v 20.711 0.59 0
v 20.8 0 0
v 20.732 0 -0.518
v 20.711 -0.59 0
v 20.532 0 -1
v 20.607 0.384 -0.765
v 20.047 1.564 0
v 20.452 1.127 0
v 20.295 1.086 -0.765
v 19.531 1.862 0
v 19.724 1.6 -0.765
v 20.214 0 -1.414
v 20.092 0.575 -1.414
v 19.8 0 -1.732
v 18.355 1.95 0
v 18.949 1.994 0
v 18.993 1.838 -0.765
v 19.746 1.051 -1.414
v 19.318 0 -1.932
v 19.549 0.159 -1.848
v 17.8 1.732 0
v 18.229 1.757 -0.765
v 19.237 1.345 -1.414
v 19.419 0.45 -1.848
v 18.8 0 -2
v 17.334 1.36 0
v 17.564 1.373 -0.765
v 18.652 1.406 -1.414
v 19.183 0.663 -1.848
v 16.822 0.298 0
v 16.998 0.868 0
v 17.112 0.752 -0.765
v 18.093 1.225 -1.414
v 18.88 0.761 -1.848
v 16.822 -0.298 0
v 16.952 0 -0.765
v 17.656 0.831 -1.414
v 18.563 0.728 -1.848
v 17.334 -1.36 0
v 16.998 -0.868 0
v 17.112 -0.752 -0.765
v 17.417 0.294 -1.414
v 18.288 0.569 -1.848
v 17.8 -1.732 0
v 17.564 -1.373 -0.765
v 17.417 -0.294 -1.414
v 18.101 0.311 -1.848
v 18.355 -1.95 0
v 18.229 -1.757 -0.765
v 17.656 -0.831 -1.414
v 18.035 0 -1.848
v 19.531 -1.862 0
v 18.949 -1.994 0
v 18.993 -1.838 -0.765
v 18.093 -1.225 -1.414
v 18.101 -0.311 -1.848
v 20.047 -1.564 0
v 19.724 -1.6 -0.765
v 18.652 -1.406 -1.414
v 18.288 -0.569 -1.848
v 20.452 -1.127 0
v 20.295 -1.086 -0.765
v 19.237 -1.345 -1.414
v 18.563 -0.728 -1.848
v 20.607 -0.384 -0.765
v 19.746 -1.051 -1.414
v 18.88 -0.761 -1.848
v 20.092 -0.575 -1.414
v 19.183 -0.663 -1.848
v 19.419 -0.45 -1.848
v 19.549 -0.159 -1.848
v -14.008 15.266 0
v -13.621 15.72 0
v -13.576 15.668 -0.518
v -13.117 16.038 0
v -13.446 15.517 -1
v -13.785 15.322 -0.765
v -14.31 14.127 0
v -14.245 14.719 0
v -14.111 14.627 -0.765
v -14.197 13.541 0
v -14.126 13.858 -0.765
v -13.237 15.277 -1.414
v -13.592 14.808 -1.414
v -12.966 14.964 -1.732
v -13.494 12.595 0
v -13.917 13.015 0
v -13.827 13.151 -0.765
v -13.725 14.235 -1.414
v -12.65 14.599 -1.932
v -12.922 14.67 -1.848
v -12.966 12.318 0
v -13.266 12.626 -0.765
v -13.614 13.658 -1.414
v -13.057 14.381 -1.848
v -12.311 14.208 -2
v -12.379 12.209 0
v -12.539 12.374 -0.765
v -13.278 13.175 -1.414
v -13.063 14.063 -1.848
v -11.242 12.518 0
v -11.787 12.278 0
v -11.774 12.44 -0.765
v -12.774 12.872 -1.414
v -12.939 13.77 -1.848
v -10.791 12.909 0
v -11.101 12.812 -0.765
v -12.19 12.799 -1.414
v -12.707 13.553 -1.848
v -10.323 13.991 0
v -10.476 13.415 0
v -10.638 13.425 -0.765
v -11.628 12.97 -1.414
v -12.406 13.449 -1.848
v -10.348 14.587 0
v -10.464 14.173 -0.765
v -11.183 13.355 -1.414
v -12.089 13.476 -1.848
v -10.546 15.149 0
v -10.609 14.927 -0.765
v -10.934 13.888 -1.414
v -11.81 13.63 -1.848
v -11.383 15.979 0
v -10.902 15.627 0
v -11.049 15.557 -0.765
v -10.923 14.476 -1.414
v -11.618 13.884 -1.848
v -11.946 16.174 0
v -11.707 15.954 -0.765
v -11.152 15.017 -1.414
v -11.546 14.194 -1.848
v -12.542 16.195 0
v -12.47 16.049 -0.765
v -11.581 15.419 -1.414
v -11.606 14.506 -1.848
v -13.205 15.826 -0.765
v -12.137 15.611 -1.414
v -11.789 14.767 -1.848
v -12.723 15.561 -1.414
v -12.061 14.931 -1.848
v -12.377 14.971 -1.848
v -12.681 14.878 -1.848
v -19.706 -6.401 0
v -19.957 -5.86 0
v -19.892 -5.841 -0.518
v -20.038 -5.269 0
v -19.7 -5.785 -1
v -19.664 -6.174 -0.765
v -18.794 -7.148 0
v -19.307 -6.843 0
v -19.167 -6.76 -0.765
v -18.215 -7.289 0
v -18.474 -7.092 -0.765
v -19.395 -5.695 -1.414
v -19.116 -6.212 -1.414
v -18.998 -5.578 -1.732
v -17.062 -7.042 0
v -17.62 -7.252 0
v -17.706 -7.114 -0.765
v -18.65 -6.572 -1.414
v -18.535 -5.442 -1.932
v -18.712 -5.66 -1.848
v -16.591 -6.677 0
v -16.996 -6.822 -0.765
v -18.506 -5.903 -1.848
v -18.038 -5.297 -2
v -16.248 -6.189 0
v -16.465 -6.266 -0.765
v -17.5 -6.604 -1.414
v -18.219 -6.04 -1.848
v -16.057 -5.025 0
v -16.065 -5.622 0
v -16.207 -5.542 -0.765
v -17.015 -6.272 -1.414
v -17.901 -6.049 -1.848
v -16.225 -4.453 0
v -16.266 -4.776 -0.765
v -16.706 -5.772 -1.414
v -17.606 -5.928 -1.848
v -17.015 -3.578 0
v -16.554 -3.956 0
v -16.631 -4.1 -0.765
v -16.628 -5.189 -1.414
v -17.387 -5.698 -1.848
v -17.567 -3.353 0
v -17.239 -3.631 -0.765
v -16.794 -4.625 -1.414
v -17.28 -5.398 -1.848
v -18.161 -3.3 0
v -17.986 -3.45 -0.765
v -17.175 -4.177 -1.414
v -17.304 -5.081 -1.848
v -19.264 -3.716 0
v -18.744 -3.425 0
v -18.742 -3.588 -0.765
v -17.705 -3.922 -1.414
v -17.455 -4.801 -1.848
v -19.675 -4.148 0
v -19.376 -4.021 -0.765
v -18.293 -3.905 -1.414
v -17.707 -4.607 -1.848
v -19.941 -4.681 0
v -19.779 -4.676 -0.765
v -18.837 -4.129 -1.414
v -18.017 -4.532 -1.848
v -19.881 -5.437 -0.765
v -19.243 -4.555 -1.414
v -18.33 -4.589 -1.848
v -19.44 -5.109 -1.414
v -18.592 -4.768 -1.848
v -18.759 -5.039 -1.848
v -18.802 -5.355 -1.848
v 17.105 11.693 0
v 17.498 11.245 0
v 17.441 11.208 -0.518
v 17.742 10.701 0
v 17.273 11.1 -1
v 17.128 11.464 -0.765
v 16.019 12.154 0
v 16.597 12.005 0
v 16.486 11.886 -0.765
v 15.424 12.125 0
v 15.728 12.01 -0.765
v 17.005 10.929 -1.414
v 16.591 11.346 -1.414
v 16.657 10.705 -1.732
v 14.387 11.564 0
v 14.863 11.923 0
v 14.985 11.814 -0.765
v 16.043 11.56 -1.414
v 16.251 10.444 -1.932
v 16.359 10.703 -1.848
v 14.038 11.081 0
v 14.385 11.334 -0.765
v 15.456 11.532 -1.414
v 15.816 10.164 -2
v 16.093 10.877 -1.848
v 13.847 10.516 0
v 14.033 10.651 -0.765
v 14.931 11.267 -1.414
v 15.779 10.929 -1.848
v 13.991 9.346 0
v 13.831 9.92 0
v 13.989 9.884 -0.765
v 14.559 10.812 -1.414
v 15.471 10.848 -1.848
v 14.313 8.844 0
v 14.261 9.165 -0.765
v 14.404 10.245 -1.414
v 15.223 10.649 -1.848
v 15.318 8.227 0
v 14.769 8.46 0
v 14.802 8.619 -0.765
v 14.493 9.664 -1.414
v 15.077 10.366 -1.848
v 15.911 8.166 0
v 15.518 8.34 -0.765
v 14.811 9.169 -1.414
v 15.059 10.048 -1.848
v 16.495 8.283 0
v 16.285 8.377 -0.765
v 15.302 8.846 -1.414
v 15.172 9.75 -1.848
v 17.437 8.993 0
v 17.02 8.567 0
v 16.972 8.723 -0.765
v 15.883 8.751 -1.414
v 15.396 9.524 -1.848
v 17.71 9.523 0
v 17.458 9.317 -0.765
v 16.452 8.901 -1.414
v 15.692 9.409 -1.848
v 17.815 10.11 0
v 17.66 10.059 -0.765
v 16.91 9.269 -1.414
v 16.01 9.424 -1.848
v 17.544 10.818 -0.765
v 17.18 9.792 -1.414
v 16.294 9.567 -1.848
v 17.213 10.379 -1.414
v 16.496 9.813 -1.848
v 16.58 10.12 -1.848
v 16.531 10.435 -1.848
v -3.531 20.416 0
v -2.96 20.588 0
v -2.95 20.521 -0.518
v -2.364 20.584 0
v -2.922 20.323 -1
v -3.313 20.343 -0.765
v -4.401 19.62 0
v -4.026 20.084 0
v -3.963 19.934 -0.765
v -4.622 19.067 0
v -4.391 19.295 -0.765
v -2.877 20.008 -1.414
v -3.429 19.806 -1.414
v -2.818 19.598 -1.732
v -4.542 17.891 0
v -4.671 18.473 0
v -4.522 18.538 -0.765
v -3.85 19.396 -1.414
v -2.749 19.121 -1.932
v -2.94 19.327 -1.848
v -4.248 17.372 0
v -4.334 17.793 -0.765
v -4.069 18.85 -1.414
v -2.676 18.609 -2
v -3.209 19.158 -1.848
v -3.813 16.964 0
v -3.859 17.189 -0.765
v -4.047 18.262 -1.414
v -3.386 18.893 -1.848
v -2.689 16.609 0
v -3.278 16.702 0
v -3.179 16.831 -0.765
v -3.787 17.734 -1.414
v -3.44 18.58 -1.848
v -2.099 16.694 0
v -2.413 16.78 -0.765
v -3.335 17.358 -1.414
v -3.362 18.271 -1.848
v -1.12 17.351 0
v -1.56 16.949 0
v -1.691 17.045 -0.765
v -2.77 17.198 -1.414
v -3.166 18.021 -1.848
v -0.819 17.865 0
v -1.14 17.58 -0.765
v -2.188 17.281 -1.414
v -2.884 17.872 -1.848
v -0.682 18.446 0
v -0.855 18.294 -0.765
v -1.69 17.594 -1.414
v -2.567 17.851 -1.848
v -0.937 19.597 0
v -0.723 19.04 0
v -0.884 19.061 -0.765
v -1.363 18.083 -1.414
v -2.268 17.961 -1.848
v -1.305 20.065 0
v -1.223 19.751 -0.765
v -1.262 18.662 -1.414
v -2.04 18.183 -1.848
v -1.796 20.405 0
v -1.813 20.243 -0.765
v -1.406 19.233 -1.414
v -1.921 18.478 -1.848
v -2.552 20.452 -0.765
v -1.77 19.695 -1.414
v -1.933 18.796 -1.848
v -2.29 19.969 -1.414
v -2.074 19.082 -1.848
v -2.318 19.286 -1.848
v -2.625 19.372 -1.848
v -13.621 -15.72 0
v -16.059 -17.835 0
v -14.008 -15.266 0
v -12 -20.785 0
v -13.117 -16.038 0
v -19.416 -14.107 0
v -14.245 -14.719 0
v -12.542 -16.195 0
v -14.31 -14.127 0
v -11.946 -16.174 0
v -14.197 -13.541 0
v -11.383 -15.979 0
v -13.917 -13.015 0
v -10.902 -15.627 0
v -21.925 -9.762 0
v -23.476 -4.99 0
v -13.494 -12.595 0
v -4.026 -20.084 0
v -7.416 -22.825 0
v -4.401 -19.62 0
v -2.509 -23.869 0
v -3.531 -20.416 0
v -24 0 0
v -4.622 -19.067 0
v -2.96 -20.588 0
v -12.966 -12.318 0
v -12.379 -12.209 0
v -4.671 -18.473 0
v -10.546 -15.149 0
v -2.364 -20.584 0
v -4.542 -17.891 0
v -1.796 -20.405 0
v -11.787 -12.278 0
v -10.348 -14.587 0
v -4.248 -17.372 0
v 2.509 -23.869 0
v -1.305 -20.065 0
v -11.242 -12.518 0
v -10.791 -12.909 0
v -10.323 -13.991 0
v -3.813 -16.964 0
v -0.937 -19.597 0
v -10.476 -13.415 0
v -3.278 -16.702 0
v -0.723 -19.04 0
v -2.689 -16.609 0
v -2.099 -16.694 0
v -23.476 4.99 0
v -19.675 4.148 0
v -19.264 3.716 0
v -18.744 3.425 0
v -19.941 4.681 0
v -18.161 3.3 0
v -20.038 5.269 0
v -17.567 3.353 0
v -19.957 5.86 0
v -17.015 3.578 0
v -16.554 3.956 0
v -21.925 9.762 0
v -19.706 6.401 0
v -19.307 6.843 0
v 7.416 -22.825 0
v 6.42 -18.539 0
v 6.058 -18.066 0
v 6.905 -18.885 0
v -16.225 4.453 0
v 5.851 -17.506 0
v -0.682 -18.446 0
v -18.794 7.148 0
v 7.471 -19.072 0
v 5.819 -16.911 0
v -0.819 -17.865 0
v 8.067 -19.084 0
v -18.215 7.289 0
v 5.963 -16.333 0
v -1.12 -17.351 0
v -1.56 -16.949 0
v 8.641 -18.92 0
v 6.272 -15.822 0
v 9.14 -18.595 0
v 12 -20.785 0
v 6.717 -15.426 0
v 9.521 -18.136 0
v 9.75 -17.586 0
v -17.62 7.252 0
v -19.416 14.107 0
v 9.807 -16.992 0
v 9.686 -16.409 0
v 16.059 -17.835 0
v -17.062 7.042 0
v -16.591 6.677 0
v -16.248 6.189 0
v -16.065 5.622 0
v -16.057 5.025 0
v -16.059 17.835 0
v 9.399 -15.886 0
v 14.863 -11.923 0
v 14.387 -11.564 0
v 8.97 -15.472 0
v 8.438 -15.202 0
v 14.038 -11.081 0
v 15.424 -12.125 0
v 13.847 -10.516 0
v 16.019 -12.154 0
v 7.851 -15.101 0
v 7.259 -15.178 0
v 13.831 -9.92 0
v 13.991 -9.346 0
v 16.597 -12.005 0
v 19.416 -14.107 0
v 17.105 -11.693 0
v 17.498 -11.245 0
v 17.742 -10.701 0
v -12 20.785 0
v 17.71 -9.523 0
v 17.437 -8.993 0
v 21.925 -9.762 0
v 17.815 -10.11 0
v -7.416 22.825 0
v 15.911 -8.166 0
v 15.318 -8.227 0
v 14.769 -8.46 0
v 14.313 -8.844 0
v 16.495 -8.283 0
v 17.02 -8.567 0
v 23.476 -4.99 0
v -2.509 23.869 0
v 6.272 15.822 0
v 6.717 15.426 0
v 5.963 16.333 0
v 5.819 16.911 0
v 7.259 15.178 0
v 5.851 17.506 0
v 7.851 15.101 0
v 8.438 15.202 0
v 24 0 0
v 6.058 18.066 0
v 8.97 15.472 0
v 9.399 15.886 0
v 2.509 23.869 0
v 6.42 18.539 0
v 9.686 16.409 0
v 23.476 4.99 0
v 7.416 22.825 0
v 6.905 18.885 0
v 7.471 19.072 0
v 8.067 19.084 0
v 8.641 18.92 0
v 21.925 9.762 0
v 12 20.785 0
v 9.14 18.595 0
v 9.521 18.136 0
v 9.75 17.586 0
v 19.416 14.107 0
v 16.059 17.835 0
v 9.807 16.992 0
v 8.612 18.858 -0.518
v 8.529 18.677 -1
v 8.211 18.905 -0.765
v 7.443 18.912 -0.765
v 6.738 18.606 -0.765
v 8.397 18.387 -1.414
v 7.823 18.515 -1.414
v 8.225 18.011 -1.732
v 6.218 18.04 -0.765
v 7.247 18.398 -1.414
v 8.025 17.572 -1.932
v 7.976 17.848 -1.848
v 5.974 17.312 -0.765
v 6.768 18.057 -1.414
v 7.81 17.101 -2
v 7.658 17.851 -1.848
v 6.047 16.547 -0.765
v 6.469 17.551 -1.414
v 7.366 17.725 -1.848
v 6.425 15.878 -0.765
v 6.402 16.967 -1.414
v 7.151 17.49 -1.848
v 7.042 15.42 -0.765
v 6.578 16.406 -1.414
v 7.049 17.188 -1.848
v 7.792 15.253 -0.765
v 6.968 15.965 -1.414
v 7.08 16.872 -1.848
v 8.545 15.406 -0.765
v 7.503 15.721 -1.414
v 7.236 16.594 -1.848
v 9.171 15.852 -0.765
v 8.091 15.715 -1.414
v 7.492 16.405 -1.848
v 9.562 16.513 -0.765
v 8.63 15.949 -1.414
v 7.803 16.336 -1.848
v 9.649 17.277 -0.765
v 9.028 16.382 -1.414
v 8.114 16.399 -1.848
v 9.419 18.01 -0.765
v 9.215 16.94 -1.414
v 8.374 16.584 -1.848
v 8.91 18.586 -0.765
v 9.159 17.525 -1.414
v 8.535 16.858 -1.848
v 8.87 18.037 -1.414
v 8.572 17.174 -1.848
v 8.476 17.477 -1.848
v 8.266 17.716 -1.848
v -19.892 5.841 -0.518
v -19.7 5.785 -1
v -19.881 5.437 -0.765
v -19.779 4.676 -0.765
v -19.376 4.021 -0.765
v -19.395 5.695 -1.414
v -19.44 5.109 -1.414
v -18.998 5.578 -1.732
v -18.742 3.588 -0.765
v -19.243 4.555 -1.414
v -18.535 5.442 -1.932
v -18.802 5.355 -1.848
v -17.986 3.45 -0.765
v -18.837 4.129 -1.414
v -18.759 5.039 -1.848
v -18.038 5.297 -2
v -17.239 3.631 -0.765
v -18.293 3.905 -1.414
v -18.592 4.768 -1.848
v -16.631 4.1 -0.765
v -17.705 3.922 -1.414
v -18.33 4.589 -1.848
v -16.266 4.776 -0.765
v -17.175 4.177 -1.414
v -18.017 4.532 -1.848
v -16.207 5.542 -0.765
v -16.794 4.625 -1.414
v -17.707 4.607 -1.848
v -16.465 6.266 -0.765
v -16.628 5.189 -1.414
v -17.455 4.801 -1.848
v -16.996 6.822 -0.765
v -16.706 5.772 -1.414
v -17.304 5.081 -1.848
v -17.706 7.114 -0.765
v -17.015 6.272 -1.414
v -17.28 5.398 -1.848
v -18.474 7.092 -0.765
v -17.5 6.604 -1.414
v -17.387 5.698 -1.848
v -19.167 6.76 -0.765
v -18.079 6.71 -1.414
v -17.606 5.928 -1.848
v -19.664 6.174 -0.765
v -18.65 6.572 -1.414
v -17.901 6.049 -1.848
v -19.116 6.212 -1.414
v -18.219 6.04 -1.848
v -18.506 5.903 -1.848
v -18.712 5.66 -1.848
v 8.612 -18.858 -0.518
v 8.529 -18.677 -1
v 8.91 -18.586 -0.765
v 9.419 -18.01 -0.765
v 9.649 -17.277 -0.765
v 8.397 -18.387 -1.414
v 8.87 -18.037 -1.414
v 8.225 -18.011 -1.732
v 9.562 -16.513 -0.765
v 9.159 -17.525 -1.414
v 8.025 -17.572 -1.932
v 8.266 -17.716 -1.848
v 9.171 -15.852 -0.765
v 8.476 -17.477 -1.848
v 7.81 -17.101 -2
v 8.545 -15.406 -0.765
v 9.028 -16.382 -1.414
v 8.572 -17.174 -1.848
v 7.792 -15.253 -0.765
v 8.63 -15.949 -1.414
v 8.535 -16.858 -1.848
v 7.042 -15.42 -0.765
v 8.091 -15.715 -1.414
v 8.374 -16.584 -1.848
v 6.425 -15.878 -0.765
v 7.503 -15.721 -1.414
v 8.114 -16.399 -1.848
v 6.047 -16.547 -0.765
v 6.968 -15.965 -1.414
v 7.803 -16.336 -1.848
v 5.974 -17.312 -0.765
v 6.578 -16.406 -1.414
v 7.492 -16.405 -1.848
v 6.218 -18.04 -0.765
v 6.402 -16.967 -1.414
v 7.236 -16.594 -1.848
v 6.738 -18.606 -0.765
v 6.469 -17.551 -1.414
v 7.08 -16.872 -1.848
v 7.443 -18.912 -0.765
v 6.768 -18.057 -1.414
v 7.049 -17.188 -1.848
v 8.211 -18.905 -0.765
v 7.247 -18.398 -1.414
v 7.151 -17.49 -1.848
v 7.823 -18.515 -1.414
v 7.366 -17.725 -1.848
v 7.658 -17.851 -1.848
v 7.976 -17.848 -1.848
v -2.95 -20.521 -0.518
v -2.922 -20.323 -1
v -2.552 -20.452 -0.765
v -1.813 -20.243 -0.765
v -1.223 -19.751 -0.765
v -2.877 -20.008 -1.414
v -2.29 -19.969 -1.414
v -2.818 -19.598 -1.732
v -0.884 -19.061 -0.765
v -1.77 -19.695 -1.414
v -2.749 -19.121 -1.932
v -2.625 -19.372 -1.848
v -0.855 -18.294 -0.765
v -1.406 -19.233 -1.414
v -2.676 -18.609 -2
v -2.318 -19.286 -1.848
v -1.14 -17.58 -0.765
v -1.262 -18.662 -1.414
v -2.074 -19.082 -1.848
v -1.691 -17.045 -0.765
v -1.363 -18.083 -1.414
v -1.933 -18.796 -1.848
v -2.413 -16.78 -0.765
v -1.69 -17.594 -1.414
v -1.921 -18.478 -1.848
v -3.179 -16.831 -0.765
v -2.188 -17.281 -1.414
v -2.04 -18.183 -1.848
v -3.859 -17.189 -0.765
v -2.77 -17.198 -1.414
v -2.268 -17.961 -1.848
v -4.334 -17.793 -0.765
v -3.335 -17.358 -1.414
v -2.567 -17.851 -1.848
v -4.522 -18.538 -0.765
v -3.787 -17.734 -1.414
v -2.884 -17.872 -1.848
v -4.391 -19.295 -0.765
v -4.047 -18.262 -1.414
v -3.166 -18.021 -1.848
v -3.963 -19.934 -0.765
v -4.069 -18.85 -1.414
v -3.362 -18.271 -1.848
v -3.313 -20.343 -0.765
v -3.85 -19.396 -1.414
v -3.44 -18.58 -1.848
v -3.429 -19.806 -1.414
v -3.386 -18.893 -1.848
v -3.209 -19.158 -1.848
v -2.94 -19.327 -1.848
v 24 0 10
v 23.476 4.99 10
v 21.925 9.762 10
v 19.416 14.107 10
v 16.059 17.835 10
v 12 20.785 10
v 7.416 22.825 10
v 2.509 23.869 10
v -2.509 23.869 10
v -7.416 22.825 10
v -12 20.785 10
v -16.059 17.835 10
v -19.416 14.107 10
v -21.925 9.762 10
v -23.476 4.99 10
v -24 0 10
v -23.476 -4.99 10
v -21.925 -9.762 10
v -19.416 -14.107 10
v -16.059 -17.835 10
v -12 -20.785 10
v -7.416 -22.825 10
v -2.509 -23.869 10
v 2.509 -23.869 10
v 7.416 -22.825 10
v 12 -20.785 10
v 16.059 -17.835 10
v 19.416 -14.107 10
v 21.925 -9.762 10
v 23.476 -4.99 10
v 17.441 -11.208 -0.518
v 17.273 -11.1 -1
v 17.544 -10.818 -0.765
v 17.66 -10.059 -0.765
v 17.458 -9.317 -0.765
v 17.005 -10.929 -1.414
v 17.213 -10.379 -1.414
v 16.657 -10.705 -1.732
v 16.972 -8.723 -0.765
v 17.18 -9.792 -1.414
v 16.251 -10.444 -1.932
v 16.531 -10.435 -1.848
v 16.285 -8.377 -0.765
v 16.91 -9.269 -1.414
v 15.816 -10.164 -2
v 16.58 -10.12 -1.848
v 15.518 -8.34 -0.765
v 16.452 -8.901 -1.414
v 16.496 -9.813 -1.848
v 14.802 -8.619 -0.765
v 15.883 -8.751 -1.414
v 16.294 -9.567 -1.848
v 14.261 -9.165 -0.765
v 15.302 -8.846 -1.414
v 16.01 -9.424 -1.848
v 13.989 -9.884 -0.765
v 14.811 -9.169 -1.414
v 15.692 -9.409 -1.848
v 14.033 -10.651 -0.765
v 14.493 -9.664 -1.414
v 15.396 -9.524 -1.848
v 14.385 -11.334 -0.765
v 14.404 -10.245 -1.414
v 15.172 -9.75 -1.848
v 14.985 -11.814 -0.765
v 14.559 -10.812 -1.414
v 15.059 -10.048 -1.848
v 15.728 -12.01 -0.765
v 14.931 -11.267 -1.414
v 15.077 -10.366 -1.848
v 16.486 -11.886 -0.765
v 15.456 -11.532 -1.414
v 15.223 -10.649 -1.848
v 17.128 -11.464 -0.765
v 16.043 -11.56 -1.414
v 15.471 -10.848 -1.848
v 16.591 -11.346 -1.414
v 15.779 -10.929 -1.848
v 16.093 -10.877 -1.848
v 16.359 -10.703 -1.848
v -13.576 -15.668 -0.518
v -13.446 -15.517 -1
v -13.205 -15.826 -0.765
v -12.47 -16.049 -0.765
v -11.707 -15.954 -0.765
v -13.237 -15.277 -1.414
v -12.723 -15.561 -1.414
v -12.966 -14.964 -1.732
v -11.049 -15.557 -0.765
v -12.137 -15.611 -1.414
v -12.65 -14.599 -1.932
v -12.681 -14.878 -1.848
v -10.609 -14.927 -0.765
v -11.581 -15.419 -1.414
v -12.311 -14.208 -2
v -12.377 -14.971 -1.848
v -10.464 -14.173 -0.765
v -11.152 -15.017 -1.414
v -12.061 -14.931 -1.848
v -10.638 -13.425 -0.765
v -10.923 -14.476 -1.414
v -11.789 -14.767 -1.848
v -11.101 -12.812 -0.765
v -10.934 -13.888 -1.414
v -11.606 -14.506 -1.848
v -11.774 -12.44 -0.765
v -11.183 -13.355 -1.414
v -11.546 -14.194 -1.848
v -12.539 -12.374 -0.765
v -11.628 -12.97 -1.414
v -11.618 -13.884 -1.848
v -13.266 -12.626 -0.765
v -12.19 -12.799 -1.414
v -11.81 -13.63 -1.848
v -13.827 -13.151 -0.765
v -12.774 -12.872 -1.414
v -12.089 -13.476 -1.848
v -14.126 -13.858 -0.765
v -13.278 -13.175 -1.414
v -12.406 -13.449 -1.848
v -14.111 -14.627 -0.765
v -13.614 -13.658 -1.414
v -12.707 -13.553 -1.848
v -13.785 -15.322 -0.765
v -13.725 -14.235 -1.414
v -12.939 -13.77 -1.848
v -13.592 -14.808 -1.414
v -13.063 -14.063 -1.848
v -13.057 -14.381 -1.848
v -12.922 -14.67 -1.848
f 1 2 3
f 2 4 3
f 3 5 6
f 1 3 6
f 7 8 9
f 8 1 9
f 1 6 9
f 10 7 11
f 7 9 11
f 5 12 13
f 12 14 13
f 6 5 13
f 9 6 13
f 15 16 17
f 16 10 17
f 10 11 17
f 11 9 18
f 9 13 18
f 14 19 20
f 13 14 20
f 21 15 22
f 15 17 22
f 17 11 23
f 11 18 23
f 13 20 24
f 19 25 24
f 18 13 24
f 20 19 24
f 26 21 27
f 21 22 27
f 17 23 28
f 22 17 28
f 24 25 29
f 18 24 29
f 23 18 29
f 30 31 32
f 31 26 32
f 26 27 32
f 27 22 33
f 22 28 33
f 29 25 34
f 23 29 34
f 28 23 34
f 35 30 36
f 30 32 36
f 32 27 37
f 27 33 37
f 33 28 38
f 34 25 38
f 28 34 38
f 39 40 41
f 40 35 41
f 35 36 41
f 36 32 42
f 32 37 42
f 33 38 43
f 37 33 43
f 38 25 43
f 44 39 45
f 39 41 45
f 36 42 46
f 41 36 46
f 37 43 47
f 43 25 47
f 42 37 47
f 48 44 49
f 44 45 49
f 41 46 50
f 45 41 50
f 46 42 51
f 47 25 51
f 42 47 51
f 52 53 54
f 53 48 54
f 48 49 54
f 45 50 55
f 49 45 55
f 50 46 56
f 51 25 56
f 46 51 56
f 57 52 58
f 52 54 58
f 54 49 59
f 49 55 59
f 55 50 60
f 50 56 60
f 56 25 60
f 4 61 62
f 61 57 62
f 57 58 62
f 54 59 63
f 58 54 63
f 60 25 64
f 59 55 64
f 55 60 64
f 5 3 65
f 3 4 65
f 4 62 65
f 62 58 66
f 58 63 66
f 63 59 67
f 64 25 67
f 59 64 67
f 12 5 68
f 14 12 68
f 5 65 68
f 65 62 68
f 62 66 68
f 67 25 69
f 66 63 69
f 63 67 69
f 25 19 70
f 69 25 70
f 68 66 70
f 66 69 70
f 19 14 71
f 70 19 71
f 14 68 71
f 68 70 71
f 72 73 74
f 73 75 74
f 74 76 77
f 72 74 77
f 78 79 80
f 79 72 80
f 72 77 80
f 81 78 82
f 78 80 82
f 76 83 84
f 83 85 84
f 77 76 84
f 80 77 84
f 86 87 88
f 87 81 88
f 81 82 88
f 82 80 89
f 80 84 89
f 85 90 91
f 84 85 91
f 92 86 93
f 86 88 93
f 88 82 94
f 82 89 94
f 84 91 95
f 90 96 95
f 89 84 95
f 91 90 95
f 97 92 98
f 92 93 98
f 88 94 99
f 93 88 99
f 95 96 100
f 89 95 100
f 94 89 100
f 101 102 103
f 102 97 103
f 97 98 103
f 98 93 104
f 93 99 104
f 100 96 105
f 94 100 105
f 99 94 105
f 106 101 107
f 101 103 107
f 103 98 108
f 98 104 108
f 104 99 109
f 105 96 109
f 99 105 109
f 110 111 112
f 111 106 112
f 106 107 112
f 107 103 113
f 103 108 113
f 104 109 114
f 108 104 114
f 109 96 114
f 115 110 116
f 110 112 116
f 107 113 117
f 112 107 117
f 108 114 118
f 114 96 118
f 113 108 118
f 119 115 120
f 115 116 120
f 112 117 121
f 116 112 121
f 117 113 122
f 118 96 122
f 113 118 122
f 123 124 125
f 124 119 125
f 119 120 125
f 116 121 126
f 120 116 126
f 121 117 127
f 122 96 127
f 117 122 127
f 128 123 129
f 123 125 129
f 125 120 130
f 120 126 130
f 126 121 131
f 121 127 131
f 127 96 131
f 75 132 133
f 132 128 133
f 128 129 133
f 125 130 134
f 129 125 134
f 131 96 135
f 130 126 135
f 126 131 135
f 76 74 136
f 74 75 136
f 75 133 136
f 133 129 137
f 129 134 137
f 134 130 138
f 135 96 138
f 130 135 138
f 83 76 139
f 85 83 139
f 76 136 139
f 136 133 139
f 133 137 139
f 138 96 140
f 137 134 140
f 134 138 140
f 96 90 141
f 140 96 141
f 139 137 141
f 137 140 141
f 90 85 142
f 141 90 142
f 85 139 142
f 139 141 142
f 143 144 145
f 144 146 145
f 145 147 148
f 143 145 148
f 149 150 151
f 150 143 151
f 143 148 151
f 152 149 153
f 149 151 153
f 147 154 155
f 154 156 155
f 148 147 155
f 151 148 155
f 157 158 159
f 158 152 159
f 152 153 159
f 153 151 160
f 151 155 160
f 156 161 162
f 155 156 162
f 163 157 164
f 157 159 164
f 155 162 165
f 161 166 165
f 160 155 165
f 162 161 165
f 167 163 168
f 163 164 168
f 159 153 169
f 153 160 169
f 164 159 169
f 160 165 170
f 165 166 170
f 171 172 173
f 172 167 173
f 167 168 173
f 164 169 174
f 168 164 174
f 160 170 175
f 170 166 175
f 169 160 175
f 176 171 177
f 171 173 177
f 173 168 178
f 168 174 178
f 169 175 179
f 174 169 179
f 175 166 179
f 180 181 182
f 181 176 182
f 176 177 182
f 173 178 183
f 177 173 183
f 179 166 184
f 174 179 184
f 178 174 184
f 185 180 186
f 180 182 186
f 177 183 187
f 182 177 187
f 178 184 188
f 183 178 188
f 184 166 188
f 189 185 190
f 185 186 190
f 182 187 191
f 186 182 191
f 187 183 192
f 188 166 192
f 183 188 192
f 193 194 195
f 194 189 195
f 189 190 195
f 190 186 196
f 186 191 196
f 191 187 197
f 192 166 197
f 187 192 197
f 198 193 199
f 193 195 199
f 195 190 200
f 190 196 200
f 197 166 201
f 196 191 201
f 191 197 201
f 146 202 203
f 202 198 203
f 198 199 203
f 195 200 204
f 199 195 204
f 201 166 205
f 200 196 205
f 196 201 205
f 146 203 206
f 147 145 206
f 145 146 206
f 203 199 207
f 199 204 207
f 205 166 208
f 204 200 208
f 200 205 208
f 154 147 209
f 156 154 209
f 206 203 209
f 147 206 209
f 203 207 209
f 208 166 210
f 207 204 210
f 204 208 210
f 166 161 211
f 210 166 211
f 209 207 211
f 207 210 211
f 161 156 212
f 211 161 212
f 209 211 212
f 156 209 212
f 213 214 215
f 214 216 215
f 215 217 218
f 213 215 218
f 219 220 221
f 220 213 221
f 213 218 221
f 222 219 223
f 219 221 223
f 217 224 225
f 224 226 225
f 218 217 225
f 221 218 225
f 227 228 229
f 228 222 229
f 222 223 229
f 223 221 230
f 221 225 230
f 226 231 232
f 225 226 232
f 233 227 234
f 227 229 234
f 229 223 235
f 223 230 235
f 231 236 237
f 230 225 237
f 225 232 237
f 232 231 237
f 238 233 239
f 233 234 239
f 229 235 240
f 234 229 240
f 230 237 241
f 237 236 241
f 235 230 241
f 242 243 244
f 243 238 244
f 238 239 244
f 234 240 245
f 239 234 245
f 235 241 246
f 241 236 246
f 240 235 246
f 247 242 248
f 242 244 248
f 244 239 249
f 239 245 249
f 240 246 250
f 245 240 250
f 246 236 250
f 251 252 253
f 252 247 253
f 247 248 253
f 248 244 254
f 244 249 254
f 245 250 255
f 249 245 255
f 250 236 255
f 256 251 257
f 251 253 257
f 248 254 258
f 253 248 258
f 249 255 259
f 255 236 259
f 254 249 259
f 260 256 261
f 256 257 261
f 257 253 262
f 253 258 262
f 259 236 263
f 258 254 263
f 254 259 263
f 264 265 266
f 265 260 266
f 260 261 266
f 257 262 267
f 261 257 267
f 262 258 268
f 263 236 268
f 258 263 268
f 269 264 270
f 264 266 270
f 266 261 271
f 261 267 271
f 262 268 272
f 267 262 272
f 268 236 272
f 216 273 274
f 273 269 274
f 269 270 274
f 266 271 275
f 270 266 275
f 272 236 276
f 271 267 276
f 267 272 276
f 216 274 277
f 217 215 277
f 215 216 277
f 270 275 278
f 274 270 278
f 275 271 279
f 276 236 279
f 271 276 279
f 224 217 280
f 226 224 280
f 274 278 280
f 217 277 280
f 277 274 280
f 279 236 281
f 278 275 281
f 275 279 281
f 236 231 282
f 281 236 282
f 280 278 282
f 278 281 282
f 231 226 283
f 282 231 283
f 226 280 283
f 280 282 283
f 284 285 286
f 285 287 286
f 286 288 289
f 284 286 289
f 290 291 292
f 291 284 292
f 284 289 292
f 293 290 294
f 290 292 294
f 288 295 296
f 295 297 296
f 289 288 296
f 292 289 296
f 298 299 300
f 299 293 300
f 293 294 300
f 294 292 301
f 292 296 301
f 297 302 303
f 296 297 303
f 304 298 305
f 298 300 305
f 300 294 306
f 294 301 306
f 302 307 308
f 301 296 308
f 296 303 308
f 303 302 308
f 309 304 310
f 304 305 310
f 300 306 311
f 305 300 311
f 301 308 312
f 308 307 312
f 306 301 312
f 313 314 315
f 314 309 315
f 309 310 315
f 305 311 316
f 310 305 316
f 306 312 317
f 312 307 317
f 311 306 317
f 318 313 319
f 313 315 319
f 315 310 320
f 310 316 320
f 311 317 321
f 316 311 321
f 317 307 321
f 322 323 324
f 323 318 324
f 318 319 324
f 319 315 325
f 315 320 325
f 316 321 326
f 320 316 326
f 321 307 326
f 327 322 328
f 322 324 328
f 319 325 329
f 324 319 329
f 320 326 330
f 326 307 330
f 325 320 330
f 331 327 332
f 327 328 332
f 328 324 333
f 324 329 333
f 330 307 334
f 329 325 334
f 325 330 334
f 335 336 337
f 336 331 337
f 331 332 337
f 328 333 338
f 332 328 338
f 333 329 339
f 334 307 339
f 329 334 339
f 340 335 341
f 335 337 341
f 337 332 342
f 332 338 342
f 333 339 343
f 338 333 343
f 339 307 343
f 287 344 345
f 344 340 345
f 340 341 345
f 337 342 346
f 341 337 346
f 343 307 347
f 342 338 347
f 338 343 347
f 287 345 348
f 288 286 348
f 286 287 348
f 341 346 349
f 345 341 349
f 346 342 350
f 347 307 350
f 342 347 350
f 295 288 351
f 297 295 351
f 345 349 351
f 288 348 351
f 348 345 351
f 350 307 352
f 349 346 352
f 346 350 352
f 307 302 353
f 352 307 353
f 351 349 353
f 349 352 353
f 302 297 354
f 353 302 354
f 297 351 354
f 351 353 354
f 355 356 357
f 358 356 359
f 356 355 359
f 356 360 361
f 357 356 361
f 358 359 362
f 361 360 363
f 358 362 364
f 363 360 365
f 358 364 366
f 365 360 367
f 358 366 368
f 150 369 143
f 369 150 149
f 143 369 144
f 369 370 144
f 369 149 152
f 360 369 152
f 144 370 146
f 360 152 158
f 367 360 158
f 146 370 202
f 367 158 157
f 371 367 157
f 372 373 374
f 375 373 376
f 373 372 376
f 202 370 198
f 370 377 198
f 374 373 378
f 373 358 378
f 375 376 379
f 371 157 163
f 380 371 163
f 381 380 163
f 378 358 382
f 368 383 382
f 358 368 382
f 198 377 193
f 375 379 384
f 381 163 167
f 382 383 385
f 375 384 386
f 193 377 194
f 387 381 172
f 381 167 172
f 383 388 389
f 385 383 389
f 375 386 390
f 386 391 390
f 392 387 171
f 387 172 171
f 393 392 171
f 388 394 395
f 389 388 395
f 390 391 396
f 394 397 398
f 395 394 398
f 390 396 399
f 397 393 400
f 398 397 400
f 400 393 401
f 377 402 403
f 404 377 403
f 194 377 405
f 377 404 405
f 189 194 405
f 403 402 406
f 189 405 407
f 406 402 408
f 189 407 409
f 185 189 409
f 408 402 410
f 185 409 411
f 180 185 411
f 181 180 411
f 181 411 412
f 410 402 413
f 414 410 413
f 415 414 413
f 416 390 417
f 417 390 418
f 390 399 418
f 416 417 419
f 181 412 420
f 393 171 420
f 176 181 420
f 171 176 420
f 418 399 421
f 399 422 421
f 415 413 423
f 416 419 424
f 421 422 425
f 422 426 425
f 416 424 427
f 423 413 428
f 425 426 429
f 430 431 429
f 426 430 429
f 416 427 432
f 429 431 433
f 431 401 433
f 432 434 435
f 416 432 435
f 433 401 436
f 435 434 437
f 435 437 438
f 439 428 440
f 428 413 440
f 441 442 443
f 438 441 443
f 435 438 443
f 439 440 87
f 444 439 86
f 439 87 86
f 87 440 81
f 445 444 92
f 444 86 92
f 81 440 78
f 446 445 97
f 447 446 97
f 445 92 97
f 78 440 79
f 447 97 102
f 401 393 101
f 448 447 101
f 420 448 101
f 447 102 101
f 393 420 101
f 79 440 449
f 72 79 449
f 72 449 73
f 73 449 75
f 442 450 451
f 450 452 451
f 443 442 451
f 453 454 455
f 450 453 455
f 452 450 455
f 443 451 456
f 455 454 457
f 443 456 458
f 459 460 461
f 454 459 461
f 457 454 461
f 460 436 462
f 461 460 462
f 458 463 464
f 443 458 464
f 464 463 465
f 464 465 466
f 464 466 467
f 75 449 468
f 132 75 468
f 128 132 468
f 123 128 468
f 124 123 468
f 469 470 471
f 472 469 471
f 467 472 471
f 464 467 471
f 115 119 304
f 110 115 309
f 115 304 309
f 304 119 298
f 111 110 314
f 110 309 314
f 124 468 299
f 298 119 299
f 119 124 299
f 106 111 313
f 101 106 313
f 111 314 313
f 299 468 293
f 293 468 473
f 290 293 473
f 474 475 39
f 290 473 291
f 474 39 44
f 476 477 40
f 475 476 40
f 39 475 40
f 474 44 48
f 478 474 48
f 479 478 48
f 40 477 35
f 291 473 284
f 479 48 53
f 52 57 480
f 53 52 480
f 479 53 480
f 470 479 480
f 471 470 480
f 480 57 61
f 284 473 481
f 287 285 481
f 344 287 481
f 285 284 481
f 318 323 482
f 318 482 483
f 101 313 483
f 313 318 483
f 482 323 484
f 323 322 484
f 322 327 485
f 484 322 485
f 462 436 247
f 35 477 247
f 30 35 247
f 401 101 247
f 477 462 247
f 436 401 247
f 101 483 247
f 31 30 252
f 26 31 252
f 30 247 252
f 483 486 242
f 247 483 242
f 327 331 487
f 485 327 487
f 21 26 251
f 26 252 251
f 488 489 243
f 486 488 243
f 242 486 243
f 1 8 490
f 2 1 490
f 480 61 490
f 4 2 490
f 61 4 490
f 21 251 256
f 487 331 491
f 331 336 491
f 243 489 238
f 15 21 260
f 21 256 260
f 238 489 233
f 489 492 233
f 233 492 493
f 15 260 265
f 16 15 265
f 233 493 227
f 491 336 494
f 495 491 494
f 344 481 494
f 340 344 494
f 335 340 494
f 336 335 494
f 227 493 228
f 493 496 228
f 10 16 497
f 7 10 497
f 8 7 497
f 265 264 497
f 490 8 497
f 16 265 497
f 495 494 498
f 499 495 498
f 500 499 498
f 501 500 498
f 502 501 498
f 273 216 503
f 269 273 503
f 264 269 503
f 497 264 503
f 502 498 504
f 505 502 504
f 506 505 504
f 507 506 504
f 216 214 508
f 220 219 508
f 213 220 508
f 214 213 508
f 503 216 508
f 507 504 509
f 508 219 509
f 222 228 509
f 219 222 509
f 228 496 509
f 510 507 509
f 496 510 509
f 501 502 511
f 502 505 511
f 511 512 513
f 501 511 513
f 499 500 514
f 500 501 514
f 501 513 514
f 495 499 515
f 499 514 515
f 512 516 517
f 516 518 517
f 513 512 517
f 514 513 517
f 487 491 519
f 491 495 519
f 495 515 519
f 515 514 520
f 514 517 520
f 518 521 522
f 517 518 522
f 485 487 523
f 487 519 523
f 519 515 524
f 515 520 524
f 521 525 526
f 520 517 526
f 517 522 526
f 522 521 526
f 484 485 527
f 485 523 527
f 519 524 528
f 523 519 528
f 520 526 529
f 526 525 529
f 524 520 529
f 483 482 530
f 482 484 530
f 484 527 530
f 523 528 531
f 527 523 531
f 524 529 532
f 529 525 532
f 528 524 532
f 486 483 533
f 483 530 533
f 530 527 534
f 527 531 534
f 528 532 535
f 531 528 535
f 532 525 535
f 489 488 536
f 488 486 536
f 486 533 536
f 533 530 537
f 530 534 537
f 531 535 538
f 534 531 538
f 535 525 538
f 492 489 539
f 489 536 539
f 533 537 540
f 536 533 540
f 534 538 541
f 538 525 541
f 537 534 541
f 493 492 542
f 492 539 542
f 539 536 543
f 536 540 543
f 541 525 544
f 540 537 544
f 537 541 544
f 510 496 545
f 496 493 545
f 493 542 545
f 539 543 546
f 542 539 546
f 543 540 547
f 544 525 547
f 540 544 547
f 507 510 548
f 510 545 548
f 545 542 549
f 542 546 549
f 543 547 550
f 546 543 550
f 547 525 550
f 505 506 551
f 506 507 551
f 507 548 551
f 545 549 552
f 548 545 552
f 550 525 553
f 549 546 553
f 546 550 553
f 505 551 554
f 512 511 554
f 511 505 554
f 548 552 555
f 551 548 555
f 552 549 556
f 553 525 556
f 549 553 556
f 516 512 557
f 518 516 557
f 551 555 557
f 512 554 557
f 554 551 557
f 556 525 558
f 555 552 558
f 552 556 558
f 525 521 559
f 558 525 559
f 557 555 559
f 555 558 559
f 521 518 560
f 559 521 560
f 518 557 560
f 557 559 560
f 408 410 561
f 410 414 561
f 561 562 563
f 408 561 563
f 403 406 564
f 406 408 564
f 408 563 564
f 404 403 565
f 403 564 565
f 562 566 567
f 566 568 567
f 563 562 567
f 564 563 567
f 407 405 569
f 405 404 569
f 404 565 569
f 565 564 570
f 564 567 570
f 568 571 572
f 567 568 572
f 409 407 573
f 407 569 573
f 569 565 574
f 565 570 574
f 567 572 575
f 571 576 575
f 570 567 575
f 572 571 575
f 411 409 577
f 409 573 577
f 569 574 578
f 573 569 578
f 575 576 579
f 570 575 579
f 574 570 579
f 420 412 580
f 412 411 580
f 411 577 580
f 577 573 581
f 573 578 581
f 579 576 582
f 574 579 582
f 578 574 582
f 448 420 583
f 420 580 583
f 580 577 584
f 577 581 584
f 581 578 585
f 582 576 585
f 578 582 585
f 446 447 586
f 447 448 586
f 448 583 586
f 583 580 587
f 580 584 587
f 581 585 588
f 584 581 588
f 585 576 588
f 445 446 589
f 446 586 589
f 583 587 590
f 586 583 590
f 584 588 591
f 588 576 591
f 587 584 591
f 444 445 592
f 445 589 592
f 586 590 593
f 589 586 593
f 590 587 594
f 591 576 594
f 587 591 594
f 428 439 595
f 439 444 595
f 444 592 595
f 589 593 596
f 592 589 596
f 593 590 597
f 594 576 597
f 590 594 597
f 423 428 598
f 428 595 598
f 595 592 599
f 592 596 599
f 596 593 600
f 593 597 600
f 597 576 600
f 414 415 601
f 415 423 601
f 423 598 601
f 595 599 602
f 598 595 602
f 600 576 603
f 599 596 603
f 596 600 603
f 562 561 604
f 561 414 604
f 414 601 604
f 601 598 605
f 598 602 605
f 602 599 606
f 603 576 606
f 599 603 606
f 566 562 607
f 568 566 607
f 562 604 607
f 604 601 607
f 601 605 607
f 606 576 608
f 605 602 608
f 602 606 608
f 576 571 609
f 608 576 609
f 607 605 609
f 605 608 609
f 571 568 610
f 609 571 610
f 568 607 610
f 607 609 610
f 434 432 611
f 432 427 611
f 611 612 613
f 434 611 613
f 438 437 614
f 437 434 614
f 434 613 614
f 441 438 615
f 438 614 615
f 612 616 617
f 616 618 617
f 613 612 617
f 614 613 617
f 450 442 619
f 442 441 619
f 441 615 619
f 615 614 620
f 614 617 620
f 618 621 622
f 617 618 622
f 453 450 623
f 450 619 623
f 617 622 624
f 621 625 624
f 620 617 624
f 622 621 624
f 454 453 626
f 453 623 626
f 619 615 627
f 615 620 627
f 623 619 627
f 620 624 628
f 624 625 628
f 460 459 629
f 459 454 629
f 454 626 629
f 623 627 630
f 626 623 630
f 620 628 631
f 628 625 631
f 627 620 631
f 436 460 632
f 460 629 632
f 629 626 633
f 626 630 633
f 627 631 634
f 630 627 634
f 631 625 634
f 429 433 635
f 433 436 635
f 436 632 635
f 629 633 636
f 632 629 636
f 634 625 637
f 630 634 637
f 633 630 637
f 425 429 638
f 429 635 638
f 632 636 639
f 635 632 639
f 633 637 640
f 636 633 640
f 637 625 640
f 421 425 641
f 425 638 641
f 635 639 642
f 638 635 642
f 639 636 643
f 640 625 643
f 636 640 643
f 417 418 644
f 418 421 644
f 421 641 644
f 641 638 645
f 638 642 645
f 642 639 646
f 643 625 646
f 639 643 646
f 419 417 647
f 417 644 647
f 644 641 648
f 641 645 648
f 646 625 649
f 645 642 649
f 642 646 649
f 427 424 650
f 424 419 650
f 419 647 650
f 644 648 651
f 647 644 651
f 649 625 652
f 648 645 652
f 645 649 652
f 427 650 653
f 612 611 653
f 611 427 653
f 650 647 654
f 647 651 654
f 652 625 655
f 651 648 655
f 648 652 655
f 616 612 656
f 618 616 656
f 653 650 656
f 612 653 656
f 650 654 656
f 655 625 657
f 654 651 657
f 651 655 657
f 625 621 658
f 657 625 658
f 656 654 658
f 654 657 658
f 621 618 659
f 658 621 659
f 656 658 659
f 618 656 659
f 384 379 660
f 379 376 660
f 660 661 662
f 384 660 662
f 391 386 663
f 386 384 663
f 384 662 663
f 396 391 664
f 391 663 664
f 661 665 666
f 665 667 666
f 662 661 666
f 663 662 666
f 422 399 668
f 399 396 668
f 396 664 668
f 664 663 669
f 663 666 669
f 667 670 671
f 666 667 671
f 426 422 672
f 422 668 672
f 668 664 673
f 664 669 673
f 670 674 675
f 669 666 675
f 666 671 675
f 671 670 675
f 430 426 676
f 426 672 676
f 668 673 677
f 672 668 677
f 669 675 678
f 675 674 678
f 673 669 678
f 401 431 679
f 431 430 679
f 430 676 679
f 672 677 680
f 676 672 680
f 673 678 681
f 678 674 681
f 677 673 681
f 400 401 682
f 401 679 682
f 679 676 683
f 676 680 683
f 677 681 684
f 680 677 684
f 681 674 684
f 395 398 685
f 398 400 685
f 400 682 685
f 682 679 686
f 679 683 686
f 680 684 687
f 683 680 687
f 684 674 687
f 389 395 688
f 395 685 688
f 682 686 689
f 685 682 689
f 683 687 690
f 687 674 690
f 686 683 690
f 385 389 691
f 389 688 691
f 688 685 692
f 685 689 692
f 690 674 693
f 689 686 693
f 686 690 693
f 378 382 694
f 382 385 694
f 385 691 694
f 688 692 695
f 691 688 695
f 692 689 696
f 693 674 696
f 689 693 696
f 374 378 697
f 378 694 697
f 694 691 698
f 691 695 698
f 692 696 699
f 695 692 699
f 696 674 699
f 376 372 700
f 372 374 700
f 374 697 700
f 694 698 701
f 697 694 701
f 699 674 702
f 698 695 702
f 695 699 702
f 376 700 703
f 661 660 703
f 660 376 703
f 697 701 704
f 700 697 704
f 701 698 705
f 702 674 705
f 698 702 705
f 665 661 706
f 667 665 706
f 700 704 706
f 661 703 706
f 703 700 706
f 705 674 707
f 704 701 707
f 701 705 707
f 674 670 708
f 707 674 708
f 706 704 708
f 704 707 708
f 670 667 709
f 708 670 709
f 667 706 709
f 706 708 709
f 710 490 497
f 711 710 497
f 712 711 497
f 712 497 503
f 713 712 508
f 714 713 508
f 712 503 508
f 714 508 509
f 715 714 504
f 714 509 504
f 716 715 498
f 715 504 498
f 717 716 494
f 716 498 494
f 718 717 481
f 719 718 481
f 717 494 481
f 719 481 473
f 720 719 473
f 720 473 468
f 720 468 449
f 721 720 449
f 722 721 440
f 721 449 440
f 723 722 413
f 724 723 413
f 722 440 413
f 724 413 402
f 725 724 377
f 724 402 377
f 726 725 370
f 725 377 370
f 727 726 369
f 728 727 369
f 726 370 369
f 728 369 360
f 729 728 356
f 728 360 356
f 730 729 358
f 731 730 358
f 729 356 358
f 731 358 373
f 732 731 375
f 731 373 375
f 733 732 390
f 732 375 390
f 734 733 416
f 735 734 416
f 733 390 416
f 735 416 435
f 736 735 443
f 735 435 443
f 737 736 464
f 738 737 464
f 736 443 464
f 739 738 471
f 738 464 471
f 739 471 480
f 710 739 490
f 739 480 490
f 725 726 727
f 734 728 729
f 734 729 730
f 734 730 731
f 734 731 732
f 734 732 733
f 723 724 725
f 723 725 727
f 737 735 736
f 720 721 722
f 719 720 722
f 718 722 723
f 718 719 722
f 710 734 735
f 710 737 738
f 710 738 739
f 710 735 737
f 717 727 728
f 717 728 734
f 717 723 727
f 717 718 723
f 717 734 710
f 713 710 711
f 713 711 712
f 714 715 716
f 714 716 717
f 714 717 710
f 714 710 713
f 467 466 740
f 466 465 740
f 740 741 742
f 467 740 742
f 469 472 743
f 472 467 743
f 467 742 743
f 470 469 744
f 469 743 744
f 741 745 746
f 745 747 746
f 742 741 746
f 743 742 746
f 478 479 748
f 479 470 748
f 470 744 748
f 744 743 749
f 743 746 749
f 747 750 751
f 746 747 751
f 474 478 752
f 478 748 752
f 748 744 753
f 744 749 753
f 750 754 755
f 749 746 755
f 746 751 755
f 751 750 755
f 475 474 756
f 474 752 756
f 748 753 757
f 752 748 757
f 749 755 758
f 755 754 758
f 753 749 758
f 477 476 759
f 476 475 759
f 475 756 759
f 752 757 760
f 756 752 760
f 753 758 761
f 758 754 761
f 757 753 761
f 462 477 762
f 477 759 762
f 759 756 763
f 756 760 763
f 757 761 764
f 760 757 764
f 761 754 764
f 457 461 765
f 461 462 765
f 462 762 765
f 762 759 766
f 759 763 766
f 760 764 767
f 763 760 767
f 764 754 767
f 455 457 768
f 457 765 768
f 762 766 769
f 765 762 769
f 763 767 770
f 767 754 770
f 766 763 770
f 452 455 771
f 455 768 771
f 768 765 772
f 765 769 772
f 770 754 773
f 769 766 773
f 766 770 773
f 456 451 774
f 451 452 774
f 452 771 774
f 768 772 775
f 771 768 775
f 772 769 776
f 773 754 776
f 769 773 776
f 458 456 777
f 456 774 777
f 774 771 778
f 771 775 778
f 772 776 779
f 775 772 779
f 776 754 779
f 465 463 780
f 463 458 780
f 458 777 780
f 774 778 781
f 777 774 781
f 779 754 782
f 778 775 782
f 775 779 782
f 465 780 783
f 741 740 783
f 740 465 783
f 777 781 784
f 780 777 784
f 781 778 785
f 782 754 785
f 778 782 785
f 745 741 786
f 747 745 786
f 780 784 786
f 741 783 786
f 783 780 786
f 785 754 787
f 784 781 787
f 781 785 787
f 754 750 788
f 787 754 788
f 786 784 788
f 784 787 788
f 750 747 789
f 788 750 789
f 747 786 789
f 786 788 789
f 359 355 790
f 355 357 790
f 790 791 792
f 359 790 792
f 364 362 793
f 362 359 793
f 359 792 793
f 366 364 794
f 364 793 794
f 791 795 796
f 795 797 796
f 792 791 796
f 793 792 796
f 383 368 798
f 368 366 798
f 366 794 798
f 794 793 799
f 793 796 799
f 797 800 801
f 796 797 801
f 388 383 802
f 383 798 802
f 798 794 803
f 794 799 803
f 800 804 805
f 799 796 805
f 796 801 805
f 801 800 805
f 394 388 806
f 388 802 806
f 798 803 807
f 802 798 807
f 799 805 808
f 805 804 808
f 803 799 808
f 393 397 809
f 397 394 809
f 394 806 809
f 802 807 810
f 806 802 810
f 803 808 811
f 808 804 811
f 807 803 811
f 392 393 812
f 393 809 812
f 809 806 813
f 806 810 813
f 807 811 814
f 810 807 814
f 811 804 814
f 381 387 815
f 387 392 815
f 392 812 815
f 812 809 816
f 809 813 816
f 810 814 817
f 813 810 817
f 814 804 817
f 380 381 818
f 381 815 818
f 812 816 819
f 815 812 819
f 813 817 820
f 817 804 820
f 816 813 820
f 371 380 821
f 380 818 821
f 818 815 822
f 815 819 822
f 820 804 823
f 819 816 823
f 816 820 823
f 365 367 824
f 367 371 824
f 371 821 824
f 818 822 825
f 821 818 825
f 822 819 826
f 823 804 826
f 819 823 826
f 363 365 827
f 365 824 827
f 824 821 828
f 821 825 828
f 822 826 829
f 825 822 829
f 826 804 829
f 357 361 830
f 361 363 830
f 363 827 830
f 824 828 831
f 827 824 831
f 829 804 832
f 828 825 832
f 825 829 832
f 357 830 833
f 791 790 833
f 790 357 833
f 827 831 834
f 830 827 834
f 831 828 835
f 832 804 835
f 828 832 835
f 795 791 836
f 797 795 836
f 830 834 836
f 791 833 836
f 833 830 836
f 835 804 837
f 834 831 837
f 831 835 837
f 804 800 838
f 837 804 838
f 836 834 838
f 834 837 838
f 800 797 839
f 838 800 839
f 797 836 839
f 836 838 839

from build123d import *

# Parameters (mm, degrees)
SKETCH1_R           = 24
BOSS_EXTRUDE1_DEPTH = 10
CIRPATTERN1_COUNT   = 11


with BuildPart() as part:
    # Sketch1 → Boss-Extrude1 (new body)
    with BuildSketch(Plane.XY):
        Circle(SKETCH1_R)
    extrude(amount=BOSS_EXTRUDE1_DEPTH)

    # Sketch3 → Revolve1 (revolve)
    with BuildSketch(Plane(origin=(0, 0, 0), x_dir=(1, 0, 0), z_dir=(0, 1, 0))):
        with BuildLine():
            Line((18.8, 2), (18.8, -2))
            ThreePointArc((18.8, -2), (20.8, 0), (18.8, 2))
        make_face()
    revolve1 = revolve(axis=Axis((18.8, 0, -2), (0, 0, 1)))

    # CirPattern1: Revolve1 ×11 about axis
    cirpattern1_axis = Axis((0, 0, 0), (0, 0, 1))
    for i in range(1, CIRPATTERN1_COUNT):
        add(revolve1.rotate(cirpattern1_axis, i * 360 / CIRPATTERN1_COUNT))


solid = part.part
